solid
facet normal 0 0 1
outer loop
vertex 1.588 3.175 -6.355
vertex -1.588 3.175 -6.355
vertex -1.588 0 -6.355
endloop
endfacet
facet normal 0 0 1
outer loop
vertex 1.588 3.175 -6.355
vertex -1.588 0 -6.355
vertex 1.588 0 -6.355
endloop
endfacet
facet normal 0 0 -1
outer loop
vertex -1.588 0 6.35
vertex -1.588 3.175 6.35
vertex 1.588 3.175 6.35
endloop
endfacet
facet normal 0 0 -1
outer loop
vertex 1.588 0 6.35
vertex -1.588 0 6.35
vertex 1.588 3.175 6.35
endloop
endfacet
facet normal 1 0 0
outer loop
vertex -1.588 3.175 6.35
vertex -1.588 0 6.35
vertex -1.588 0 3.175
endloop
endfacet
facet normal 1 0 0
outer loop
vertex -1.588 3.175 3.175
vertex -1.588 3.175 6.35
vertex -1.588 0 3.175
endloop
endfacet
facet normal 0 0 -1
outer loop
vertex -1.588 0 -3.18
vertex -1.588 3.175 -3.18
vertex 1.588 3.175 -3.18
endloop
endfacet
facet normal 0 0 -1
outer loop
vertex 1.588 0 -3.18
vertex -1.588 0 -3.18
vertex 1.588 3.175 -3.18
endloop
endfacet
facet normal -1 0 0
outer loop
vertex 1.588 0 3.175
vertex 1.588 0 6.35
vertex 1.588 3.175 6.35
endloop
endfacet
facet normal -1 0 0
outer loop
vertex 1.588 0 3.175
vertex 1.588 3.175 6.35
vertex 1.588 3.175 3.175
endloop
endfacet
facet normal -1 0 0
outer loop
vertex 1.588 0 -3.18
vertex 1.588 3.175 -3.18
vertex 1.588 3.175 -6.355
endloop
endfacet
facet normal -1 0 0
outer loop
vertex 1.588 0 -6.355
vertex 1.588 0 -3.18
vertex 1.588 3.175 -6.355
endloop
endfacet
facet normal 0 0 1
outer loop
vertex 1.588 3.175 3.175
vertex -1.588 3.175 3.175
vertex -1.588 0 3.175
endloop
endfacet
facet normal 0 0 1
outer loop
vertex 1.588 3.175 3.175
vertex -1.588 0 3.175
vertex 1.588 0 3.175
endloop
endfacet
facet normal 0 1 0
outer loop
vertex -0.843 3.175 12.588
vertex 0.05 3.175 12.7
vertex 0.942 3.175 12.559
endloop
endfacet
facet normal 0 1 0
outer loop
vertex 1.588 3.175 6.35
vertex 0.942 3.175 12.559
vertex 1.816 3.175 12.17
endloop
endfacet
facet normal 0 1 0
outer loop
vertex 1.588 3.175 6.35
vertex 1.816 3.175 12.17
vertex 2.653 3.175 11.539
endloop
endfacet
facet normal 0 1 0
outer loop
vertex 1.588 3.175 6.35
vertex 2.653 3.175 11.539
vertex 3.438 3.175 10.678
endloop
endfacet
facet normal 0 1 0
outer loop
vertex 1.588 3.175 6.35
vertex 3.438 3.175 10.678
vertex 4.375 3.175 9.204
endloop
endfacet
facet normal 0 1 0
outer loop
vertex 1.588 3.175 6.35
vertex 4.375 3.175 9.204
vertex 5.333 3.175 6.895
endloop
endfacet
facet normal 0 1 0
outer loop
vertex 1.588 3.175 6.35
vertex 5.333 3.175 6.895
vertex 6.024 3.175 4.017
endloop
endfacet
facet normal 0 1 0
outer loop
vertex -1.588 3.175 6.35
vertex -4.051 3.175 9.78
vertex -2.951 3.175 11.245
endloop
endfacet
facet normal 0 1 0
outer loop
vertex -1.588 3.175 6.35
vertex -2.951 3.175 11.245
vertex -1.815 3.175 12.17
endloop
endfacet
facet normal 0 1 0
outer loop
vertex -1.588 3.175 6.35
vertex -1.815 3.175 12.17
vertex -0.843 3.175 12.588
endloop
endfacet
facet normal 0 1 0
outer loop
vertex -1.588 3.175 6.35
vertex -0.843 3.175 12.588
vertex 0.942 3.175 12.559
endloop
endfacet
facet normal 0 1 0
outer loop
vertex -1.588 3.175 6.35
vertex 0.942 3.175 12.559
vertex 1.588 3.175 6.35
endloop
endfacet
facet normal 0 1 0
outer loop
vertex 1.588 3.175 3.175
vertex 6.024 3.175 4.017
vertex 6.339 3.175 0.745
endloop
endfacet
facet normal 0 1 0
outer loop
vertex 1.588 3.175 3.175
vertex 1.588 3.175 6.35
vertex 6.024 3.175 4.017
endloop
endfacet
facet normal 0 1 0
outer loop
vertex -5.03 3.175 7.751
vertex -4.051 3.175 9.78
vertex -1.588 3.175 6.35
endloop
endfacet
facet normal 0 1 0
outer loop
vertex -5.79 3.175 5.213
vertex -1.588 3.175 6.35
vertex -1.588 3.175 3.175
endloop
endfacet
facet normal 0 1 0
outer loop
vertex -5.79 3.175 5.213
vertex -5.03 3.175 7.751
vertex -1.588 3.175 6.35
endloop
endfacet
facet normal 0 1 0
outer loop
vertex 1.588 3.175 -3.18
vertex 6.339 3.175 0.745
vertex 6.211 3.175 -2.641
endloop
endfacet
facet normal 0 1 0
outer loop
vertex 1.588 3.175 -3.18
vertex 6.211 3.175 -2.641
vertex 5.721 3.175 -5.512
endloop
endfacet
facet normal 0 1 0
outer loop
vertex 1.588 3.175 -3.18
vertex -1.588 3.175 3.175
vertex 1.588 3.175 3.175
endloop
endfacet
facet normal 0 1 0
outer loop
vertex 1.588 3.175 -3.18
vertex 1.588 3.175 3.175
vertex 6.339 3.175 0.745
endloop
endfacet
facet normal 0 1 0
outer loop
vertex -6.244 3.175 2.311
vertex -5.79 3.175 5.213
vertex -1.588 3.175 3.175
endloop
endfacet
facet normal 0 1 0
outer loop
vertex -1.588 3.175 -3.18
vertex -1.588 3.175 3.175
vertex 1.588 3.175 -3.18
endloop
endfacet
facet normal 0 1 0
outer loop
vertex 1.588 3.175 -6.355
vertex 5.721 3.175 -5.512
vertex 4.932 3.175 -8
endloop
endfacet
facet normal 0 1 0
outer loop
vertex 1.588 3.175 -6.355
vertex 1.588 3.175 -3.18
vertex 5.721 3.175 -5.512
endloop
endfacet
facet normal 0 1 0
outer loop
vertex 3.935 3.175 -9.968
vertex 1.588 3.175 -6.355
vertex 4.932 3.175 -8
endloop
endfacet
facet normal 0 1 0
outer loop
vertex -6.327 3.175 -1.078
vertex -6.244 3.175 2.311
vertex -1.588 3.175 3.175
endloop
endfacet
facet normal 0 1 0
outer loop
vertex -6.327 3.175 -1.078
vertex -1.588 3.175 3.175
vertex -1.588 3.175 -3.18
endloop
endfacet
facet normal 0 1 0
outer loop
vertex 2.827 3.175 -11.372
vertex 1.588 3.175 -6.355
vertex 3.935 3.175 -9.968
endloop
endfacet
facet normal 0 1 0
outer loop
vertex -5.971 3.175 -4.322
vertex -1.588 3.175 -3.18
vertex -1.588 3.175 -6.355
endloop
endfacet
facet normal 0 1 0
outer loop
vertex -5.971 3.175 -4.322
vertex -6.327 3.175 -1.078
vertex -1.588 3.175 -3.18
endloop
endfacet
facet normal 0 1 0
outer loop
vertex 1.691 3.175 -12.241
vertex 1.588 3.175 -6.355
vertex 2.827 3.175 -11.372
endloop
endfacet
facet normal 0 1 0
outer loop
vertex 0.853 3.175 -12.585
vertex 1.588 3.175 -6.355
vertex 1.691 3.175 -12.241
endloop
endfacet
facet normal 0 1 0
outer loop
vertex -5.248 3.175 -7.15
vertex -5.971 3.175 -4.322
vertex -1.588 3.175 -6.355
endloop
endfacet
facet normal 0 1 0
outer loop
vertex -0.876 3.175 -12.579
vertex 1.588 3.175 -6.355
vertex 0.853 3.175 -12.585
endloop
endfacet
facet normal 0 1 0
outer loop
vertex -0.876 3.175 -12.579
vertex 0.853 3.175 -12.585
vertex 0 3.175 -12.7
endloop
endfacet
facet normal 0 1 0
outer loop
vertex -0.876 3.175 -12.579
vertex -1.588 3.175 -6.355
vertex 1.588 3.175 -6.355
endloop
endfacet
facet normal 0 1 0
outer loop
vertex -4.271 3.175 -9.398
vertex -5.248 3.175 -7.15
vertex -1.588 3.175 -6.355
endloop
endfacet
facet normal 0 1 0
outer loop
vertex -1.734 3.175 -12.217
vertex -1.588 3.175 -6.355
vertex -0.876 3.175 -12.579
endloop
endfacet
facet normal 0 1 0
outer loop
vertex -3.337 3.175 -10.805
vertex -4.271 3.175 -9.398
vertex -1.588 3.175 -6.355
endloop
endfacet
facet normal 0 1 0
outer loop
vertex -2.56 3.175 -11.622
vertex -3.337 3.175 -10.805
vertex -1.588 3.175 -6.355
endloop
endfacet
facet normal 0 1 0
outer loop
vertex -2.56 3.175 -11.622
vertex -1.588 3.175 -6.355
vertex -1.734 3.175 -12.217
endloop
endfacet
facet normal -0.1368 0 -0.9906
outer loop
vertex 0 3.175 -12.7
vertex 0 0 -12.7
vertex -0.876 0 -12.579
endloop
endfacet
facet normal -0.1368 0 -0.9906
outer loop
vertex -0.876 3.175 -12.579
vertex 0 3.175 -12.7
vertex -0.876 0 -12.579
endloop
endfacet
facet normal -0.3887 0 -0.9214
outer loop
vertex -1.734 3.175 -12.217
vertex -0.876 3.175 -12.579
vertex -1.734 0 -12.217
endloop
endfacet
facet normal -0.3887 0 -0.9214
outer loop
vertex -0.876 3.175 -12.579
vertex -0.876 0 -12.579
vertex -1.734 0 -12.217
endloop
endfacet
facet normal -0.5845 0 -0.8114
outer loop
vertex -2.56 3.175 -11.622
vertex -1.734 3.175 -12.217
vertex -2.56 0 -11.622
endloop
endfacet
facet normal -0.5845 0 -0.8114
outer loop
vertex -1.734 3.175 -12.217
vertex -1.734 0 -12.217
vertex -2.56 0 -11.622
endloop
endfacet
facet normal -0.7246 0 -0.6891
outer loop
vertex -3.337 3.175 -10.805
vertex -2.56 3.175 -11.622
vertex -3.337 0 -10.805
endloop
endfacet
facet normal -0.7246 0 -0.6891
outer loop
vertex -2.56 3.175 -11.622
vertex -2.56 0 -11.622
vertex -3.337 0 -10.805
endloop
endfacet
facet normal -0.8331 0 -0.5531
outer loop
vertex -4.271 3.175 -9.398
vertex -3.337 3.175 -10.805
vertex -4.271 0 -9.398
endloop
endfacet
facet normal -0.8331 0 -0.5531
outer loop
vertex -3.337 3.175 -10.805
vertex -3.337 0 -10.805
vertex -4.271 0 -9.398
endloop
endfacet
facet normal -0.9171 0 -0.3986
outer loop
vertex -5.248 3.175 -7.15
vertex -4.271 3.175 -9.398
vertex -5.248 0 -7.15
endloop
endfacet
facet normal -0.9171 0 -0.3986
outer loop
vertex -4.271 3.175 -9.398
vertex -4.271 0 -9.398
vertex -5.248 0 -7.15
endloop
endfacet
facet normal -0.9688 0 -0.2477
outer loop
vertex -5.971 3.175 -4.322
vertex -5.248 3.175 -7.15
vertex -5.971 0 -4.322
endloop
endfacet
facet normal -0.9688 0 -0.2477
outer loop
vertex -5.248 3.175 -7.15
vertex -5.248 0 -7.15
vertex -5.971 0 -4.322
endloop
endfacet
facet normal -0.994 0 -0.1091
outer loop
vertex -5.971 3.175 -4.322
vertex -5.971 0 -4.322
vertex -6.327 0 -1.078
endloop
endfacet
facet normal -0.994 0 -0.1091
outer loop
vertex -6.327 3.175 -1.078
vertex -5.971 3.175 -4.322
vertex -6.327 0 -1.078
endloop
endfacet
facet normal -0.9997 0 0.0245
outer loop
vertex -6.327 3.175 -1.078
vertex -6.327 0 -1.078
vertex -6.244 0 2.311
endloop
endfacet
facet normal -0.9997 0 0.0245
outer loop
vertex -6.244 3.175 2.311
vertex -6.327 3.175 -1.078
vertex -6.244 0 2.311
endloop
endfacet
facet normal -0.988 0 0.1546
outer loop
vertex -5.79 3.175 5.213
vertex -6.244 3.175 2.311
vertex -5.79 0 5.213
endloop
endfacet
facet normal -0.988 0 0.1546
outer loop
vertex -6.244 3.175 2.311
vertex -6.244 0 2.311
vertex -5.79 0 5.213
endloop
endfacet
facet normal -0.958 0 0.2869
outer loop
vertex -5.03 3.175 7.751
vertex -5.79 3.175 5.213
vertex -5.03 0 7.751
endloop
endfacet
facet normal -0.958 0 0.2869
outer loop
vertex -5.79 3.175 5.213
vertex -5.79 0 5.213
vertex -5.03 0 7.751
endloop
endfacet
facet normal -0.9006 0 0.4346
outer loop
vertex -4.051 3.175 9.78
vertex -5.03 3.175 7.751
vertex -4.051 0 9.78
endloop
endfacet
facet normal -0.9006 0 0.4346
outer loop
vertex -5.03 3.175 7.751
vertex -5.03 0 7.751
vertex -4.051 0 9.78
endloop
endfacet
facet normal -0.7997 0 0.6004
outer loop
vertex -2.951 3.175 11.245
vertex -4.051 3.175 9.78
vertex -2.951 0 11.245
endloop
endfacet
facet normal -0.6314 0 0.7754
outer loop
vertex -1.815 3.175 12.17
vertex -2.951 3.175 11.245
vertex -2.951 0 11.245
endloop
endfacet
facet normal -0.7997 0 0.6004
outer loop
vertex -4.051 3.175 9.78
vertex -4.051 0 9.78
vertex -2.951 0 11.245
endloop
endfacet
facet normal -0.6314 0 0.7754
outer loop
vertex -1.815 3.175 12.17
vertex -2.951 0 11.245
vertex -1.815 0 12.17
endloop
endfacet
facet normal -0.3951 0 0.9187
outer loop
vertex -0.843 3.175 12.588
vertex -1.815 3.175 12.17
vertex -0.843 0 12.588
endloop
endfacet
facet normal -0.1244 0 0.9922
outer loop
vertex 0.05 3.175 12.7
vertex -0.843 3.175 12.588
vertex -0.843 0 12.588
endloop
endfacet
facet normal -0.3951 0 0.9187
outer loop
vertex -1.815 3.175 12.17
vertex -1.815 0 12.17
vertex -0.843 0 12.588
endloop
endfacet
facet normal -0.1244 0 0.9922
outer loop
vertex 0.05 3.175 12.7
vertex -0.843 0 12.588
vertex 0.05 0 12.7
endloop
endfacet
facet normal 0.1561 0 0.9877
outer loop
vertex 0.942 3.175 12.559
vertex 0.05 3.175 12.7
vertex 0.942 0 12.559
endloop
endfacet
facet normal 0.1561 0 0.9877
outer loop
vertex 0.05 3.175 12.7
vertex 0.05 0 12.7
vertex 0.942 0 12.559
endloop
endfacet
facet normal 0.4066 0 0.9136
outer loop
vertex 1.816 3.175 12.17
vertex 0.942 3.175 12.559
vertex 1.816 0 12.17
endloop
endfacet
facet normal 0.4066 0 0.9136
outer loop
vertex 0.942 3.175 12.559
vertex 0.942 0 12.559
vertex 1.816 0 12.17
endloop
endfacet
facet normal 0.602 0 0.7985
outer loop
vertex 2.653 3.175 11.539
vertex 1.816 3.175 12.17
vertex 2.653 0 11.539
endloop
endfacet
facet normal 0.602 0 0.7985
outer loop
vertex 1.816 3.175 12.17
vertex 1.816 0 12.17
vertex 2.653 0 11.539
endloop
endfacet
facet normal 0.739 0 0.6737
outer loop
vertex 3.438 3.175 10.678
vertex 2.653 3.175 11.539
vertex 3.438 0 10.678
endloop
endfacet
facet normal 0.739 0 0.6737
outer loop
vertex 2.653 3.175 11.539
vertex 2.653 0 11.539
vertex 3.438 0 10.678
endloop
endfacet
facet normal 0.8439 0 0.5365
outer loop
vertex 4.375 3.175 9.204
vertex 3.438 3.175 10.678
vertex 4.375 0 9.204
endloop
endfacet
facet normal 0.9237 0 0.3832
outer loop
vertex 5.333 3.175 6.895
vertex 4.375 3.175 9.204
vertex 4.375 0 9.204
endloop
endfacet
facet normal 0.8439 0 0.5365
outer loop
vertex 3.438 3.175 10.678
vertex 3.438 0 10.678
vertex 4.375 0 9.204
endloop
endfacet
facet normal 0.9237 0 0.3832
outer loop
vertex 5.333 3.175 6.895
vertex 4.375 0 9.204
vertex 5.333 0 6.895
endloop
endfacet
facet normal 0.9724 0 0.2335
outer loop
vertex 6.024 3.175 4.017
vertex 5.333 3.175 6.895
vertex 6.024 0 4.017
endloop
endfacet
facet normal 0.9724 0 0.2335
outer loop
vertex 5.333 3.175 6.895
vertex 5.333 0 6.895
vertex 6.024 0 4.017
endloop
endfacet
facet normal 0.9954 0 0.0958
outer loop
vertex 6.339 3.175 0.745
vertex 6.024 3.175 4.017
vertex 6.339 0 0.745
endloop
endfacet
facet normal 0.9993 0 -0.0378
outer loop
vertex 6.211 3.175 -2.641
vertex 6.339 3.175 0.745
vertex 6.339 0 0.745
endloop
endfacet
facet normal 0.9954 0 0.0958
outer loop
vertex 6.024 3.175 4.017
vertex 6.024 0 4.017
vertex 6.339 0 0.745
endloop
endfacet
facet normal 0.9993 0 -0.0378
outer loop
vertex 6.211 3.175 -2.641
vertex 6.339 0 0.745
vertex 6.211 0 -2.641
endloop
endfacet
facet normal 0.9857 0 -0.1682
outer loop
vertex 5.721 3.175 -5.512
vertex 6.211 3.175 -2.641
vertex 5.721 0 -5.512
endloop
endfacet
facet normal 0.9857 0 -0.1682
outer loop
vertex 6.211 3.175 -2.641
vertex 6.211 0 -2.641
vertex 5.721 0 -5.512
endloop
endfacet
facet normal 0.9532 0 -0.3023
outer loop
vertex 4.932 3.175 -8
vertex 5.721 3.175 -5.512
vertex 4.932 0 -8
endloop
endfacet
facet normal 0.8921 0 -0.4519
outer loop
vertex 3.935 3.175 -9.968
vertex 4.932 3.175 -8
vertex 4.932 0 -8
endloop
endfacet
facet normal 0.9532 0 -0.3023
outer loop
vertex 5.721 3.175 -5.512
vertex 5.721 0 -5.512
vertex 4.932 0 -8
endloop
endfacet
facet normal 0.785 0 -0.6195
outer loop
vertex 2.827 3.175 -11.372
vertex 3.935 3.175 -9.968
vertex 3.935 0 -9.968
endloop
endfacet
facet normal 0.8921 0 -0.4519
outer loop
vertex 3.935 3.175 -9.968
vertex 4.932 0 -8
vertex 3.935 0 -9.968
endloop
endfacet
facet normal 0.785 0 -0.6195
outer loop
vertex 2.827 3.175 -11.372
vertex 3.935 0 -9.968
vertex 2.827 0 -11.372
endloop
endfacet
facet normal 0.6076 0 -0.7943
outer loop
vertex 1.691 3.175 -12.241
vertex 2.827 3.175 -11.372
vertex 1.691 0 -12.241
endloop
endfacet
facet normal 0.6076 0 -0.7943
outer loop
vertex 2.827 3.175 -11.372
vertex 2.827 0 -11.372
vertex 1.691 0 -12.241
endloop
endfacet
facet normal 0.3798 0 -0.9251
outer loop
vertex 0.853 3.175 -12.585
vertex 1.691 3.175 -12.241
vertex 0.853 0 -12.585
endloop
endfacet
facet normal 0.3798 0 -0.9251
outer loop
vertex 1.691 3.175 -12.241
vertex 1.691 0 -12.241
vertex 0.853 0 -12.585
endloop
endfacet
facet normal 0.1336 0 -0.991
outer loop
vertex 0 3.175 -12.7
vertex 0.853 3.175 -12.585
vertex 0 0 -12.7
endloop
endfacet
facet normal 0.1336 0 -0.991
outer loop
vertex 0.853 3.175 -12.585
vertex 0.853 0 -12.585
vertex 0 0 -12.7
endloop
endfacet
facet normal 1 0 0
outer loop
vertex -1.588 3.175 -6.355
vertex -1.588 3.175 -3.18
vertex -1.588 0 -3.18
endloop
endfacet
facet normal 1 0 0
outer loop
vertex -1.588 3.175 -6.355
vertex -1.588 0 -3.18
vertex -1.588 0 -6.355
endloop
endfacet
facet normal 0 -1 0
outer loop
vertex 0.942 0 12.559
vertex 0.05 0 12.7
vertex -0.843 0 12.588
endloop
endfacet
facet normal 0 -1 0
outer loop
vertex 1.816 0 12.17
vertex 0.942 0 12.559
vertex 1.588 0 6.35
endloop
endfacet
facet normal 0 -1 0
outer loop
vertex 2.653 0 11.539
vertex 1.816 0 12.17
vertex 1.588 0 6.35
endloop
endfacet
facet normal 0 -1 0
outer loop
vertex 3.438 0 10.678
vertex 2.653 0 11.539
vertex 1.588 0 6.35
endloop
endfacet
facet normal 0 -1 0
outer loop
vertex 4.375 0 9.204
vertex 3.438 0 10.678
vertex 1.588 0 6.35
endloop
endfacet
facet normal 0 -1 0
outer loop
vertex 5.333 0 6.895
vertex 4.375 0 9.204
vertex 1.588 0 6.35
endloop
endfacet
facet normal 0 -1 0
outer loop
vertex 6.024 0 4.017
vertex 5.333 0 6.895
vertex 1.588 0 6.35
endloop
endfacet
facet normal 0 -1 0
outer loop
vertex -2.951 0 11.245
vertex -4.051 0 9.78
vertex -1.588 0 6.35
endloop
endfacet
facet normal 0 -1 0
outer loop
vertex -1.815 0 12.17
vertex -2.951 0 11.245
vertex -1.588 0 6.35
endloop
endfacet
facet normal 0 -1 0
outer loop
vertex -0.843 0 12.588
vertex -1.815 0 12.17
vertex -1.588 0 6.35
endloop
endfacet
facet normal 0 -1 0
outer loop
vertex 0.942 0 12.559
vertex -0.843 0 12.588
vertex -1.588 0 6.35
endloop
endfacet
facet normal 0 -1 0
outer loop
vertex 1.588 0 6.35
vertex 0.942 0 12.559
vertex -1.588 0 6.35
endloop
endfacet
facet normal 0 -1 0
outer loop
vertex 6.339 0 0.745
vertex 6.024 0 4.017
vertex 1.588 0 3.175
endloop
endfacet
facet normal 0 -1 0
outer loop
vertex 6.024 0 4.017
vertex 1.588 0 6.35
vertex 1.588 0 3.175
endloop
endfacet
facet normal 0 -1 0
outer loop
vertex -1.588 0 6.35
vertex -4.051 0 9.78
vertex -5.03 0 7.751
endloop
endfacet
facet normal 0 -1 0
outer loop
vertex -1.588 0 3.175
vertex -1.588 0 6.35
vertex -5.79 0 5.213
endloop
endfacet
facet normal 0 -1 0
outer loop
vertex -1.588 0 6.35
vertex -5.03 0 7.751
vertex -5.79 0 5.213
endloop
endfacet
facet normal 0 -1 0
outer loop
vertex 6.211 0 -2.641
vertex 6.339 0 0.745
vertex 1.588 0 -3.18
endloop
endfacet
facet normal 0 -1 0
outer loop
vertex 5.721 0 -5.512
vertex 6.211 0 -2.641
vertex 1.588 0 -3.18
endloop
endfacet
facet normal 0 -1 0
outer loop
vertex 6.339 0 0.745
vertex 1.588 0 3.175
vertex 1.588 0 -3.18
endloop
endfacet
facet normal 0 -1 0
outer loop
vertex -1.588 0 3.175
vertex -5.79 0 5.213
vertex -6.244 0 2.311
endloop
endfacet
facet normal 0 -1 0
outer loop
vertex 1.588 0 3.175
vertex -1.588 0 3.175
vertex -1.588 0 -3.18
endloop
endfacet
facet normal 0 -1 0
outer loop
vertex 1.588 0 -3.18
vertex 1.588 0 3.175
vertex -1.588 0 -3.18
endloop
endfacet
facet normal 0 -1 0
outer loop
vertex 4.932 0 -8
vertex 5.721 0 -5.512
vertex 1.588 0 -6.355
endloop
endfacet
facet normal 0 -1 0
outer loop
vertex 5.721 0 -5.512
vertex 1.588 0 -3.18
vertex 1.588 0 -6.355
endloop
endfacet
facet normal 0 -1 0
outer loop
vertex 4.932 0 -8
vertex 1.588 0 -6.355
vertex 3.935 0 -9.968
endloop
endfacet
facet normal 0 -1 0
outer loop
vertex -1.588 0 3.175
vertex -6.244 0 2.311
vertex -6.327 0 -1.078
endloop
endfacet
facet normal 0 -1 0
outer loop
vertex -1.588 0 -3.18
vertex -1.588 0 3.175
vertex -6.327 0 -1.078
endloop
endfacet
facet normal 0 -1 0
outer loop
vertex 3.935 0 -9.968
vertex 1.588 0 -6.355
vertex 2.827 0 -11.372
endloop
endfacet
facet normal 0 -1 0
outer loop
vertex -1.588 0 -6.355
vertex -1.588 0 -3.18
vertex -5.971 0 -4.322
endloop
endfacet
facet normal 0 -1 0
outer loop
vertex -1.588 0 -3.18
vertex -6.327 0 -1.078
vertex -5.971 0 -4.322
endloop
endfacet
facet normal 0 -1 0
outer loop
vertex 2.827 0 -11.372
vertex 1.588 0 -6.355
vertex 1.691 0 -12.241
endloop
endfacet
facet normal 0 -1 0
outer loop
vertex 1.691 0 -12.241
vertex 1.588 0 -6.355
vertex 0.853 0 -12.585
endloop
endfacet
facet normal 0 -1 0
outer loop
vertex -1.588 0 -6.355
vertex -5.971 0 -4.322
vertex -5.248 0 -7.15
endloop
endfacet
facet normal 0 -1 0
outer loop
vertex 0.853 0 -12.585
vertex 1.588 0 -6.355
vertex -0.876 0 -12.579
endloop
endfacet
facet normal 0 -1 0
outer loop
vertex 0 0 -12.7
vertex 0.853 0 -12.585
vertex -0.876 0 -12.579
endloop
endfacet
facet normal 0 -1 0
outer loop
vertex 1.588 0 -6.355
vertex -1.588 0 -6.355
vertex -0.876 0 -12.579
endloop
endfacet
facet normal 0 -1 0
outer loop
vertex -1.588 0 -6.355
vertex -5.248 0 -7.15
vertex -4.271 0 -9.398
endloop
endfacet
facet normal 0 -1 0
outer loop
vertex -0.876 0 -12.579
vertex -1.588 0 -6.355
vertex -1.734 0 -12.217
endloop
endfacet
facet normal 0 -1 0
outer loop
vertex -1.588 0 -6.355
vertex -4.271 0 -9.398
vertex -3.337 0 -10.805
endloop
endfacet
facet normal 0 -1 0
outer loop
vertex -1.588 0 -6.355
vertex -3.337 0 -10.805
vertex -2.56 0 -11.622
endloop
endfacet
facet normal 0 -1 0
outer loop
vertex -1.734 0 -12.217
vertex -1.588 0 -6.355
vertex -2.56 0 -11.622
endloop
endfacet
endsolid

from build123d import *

# Parameters (mm, degrees)
SKETCH1_RX          = 12.7
SKETCH1_RY          = 6.35
BOSS_EXTRUDE1_DEPTH = 3.175
SKETCH2_W           = 3.175
SKETCH2_H           = 3.175
CUT_EXTRUDE1_DEPTH  = 4.175


with BuildPart() as part:
    # Sketch1 → Boss-Extrude1 (new body)
    with BuildSketch(Plane(origin=(0, 0, 0), x_dir=(1, 0, 0), z_dir=(0, 1, 0))):
        with Locations(Location((0, 0), (0, 0, 90))):
            Ellipse(SKETCH1_RX, SKETCH1_RY)
    extrude(amount=BOSS_EXTRUDE1_DEPTH)

    # Sketch2 → Cut-Extrude1 (cut, through all)
    with BuildSketch(Plane(origin=(0, 3.175, 0), x_dir=(1, 0, 0), z_dir=(0, 1, 0))):
        with Locations((0, 4.7675)):
            Rectangle(SKETCH2_W, SKETCH2_H)
        with Locations((0, -4.7625)):
            Rectangle(SKETCH2_W, SKETCH2_H)
    extrude(amount=-CUT_EXTRUDE1_DEPTH, mode=Mode.SUBTRACT)


solid = part.part
